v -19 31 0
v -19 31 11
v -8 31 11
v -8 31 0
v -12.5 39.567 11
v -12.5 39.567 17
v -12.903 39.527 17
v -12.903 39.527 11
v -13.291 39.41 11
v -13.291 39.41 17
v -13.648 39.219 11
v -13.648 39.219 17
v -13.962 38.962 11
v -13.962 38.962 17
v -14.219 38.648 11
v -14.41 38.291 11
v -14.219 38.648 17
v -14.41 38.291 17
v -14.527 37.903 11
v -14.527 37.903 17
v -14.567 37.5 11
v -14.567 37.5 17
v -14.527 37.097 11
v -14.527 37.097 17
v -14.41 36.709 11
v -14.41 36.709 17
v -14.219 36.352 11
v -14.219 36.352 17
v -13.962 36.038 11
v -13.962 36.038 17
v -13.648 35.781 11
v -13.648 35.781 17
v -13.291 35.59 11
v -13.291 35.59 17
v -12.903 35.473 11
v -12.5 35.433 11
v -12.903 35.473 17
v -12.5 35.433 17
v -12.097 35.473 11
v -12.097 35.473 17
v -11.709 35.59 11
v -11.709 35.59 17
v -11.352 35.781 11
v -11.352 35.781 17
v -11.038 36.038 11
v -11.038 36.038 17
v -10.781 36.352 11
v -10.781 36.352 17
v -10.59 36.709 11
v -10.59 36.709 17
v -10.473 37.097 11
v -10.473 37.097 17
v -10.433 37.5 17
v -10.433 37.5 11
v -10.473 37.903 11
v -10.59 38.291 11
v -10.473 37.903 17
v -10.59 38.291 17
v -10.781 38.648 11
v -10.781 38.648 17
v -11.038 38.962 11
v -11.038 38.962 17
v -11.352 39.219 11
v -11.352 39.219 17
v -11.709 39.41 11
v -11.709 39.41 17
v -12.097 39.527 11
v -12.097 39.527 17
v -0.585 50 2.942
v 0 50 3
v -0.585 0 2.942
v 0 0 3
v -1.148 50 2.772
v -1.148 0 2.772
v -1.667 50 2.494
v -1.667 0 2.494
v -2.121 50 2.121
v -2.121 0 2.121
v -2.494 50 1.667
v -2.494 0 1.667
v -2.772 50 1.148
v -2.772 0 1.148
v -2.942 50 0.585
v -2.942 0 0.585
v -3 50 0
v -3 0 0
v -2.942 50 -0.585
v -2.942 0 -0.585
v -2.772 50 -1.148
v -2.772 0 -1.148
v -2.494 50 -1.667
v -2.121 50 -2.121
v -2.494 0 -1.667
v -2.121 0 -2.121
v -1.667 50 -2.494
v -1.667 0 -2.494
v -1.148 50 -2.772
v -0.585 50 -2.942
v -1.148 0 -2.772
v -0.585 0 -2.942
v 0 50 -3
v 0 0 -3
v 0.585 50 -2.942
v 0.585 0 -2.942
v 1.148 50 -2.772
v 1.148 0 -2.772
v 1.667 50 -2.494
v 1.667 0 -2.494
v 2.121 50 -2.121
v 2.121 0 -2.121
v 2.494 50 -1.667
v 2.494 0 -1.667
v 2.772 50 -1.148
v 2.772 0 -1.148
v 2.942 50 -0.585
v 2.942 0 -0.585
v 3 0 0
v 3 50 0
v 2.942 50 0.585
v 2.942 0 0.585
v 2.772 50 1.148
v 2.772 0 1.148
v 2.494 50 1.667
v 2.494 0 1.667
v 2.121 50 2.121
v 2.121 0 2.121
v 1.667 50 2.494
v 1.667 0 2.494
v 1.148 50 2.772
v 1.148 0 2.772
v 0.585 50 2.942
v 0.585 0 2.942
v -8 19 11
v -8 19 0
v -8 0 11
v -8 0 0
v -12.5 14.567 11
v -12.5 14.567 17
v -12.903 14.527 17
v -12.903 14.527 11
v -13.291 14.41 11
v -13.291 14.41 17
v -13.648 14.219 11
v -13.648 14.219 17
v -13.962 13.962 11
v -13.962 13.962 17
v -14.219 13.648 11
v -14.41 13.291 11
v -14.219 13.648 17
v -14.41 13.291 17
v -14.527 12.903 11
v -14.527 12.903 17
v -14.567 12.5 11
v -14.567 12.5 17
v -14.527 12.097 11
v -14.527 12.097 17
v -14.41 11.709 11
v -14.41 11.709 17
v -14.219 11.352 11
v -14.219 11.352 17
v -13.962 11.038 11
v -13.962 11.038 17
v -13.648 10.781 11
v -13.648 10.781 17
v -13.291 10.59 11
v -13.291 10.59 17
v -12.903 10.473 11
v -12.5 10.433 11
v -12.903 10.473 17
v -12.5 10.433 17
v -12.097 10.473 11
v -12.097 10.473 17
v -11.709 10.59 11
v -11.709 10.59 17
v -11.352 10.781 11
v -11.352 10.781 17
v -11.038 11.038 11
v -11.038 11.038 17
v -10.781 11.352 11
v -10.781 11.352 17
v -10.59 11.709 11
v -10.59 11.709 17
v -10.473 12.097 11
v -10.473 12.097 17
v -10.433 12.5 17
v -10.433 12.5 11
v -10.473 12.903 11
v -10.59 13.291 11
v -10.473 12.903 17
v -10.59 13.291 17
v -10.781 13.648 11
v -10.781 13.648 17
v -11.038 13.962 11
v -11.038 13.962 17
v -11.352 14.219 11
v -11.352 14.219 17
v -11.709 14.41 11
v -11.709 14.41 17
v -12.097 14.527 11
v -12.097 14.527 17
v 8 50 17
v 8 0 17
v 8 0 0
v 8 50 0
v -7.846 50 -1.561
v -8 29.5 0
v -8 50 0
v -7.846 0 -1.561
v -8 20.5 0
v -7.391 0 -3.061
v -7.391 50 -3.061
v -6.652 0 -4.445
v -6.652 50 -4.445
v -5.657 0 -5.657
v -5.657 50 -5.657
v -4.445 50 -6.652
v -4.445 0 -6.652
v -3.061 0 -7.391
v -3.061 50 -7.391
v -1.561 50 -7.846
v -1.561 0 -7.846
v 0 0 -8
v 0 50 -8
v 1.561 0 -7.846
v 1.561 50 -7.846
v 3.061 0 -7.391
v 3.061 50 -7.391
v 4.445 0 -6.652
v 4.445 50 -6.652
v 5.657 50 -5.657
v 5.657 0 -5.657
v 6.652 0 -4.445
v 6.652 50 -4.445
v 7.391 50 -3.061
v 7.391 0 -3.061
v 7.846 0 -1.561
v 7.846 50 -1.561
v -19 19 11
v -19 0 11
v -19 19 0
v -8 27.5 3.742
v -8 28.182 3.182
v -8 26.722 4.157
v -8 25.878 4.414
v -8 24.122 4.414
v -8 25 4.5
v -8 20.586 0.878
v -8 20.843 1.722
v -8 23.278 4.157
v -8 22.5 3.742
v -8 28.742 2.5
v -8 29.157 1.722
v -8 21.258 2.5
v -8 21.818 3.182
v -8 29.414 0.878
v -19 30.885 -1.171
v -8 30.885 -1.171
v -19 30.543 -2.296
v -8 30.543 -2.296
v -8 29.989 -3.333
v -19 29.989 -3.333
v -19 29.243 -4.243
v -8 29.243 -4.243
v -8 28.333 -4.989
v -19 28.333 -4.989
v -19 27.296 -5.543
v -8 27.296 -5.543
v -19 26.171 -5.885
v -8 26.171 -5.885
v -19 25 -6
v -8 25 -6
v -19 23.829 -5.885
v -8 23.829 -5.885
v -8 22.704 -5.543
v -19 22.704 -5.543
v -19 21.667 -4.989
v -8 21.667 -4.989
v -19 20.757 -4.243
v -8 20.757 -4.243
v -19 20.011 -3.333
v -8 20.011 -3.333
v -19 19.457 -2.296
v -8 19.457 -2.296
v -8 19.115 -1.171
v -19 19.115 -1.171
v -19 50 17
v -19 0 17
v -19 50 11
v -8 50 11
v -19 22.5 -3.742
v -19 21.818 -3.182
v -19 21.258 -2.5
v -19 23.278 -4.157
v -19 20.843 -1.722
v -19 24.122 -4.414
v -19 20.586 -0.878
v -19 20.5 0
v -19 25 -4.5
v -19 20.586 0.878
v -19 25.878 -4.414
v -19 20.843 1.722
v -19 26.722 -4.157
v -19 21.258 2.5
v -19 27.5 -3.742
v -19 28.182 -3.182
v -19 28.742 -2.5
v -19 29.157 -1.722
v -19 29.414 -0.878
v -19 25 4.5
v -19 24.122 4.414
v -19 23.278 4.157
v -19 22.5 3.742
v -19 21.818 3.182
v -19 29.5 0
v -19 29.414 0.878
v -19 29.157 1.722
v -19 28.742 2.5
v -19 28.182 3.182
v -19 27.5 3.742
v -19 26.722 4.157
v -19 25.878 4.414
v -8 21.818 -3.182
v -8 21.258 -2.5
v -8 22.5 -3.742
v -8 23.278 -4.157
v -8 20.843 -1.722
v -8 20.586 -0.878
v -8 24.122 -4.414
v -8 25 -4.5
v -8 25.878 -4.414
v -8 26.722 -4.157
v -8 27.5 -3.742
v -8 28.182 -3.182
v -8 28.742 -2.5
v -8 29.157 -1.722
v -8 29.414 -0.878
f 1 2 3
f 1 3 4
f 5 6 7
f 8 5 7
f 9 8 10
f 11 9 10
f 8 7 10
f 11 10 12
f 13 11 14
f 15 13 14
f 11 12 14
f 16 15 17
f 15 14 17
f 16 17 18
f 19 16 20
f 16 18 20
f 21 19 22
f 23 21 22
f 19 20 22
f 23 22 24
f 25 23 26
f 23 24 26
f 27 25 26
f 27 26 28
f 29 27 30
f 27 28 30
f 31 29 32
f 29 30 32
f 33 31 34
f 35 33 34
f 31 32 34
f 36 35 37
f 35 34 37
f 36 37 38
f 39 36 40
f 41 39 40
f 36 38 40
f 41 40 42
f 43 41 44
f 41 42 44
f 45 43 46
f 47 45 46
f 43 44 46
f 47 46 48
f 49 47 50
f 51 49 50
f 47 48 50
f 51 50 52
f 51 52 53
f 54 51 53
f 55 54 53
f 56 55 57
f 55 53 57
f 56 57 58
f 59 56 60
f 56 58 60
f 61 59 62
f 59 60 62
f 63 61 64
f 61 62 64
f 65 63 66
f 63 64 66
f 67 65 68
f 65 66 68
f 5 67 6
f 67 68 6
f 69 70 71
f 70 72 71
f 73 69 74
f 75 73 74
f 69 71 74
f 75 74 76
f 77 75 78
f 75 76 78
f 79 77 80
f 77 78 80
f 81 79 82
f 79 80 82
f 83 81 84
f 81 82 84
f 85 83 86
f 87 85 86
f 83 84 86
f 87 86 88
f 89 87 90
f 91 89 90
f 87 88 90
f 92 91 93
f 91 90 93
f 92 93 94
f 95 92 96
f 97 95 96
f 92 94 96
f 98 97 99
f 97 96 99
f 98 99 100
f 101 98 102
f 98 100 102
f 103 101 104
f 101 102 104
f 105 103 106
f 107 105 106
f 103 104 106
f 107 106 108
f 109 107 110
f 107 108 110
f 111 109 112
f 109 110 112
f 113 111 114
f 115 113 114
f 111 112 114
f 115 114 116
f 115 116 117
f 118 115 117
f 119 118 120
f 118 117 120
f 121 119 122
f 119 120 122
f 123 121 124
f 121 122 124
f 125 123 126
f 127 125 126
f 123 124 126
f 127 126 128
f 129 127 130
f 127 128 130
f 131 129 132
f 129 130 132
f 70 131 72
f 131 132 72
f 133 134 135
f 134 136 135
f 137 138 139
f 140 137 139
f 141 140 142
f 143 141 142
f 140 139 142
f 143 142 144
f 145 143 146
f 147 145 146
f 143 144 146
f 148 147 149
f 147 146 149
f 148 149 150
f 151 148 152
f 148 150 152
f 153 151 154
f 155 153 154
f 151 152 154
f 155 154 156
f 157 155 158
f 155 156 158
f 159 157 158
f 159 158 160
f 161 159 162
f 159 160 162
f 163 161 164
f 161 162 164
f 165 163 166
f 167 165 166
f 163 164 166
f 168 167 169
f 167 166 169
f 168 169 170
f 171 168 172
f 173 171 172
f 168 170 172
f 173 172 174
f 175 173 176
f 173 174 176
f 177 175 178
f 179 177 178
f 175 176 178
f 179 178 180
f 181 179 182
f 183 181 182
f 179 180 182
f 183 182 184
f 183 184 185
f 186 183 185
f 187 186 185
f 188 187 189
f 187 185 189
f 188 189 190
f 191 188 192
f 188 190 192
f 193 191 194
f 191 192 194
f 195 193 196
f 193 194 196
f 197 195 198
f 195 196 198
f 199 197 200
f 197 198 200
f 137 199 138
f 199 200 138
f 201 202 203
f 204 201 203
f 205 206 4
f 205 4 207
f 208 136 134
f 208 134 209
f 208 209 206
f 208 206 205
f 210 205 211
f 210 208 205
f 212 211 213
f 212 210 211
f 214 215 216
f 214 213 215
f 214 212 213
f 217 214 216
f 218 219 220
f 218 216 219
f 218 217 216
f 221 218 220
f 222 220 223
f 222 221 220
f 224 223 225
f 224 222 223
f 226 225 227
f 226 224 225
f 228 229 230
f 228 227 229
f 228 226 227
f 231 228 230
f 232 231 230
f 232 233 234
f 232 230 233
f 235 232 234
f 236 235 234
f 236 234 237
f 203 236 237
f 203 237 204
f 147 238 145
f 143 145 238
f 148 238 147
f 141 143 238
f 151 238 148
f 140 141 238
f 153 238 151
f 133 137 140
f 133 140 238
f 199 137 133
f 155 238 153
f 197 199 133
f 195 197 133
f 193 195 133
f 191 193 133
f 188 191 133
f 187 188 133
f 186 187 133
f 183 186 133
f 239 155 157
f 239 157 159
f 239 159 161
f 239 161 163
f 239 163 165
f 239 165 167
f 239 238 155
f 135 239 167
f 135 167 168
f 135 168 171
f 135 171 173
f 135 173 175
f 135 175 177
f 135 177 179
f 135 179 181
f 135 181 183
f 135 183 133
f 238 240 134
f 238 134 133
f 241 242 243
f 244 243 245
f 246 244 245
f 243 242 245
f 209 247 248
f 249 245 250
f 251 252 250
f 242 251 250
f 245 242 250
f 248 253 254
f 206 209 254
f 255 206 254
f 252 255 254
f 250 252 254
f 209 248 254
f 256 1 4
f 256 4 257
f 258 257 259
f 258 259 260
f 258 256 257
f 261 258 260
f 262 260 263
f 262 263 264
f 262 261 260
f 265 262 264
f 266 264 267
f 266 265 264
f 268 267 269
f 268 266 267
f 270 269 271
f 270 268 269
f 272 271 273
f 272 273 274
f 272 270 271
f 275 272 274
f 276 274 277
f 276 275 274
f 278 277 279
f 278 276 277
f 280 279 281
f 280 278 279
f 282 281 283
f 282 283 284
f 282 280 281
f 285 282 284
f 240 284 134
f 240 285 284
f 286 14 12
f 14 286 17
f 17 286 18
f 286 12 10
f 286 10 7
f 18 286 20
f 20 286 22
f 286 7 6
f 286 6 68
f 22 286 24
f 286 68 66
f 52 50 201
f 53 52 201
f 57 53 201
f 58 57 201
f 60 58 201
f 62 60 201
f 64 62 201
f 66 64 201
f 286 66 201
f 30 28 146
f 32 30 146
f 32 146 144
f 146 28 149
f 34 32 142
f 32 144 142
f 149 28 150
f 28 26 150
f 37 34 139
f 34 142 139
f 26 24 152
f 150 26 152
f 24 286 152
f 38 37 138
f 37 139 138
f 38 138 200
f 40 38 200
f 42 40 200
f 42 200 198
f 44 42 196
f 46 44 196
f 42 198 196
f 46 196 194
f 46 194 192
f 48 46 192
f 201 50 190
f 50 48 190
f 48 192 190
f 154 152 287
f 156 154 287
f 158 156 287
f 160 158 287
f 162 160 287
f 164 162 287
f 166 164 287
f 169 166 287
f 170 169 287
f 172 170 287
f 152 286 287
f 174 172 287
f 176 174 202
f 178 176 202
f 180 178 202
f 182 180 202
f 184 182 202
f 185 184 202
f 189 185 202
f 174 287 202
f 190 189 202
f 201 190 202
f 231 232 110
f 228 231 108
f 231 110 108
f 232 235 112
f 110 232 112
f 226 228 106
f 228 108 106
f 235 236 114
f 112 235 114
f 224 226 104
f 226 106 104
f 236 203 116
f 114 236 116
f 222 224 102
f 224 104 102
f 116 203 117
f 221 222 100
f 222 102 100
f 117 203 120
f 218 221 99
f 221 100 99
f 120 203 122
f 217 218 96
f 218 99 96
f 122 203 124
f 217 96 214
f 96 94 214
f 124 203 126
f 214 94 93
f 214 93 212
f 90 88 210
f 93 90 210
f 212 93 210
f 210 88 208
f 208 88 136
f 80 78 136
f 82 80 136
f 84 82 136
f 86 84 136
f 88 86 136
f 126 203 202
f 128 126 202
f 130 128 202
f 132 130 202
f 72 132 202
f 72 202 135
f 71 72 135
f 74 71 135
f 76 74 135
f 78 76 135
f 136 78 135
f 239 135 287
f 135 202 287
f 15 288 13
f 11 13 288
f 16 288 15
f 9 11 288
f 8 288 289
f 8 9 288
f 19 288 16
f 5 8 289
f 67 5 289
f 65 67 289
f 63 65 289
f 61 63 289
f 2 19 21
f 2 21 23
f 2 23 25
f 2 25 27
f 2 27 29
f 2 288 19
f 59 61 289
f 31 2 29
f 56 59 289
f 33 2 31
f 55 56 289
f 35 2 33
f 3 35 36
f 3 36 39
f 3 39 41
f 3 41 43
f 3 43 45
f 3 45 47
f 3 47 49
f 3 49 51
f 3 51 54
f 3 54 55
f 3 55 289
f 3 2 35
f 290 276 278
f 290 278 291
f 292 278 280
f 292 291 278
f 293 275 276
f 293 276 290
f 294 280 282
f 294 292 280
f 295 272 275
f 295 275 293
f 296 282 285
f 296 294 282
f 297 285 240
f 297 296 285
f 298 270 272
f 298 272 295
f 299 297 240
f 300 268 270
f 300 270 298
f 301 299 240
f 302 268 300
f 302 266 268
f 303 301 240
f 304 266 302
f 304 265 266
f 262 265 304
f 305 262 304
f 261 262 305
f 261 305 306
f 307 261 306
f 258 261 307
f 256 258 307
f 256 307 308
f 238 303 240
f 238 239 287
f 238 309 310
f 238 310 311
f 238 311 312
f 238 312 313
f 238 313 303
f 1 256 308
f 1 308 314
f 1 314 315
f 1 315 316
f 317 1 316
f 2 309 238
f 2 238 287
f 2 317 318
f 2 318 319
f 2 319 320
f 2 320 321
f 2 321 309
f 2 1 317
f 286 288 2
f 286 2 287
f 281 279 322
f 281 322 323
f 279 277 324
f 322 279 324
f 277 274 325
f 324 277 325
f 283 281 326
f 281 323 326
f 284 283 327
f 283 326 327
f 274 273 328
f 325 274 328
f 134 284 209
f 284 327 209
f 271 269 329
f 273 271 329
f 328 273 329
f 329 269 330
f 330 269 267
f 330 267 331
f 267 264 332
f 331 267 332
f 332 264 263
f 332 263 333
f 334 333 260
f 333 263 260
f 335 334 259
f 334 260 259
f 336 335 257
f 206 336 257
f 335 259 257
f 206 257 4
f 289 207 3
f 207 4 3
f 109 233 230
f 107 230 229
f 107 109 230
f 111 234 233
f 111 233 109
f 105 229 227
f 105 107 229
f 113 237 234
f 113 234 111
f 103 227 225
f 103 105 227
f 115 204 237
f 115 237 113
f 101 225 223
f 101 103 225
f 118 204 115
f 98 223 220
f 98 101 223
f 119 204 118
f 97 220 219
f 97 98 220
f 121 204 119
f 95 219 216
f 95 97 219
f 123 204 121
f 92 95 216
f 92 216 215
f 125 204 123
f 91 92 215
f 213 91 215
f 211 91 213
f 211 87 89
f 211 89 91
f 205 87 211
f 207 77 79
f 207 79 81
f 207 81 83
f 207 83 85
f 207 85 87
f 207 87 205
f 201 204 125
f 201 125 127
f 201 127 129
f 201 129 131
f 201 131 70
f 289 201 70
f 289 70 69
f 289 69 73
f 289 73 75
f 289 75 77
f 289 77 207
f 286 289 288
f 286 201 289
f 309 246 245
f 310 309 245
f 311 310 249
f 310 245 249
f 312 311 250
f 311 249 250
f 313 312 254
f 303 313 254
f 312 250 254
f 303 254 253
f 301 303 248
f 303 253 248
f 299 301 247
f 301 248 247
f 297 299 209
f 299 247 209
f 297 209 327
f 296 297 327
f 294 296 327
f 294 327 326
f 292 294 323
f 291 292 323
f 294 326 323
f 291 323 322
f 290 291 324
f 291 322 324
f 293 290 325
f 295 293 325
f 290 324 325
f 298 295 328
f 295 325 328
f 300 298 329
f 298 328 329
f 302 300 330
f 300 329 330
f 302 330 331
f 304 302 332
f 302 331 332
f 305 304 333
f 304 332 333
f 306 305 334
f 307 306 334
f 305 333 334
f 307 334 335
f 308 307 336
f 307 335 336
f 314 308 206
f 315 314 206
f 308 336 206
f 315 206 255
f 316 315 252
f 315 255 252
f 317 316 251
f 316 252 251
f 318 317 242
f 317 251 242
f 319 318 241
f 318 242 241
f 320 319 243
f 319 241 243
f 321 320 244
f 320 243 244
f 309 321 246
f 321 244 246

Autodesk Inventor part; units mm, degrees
ref_plane "YZ Plane" through (0, 0, 0) normal (1, 0, 0) x (0, 1, 0)
ref_plane "XZ Plane" through (0, 0, 0) normal (0, 1, 0) x (-1, 0, 0)
ref_plane "XY Plane" through (0, 0, 0) normal (0, 0, 1) x (1, 0, 0)
sketch "Skizze1" plane through (0, 0, 0) normal (0, 1, 0) x (-1, 0, 0)
  arc A0 (-8, 0) -> (8, 0) centre (0, 0) ccw
  line L0 (8, 0) -> (8, 11)
  line L1 (8, 17) -> (-8, 17)
  line L2 (-8, 17) -> (-8, 0)
  line L3 (8, 17) -> (19, 17)
  line L4 (19, 17) -> (19, 11)
  line L5 (19, 11) -> (8, 11)
  dimension "d0" = 16
  dimension "d1" = 16
  dimension "d2" = 6
  dimension "d3" = 19
  dimension "d4" = 11
  dimension "d5" = 17
extrude "Extrusion1" add sketch "Skizze1" along normal blind 50
sketch "Skizze2" plane through (0, 50, 0) normal (0, 1, 0) x (1, 0, 0)
  arc A0 (8, 0) -> (-8, 0) centre (0, 0) ccw projected
hole "Bohrung1" at (0, 50, 0) direction (0, -1, 0) diameter 6 end through all
sketch "Skizze3" plane through (-19, 0, 11) normal (-1, 0, 0) x (0, 0, 1)
  line L0 (0, 0) -> (0, 50) projected
  line L1 (0, 31) -> (-11, 31)
  arc A0 (-11, 31) -> (-11, 19) centre (-11, 25) ccw
  line L2 (-11, 19) -> (0, 19)
  line L3 (0, 31) -> (0, 19)
  point P0 (-11, 0)
  point P1 (0, 25)
  dimension "d15" = 6
extrude "Extrusion2" add sketch "Skizze3" against normal up to surface (11 mm away)
sketch "Skizze4" plane through (-19, 0, 11) normal (-1, 0, 0) x (0, 0, 1)
  arc A0 (-11, 31) -> (-11, 19) centre (-11, 25) ccw projected
  point P0 (-11, 0)
hole "Bohrung2" at (-19, 25, 0) direction (1, 0, 0) diameter 9 depth 11
sketch "Skizze5" plane through (-8, 50, 11) normal (0, 0, -1) x (-1, 0, 0)
  line L0 (11, -19) -> (11, 0) projected
  line L1 (11, -31) -> (11, -19) projected
  point P0 (-8, -50)
  point P1 (4.5, -12.5)
  point P2 (4.5, -37.5)
  point P3 (11, -25)
  dimension "d32" = 6.5
  dimension "d33" = 12.5
  dimension "d34" = 25
hole "Bohrung3" at (-12.5, 37.5, 11) at (-12.5, 12.5, 11) direction (0, 0, 1) diameter 4.134 end through all thread size "M5x0.8" class "6H" standard "ISO Metric profile"
properties part number "103"
